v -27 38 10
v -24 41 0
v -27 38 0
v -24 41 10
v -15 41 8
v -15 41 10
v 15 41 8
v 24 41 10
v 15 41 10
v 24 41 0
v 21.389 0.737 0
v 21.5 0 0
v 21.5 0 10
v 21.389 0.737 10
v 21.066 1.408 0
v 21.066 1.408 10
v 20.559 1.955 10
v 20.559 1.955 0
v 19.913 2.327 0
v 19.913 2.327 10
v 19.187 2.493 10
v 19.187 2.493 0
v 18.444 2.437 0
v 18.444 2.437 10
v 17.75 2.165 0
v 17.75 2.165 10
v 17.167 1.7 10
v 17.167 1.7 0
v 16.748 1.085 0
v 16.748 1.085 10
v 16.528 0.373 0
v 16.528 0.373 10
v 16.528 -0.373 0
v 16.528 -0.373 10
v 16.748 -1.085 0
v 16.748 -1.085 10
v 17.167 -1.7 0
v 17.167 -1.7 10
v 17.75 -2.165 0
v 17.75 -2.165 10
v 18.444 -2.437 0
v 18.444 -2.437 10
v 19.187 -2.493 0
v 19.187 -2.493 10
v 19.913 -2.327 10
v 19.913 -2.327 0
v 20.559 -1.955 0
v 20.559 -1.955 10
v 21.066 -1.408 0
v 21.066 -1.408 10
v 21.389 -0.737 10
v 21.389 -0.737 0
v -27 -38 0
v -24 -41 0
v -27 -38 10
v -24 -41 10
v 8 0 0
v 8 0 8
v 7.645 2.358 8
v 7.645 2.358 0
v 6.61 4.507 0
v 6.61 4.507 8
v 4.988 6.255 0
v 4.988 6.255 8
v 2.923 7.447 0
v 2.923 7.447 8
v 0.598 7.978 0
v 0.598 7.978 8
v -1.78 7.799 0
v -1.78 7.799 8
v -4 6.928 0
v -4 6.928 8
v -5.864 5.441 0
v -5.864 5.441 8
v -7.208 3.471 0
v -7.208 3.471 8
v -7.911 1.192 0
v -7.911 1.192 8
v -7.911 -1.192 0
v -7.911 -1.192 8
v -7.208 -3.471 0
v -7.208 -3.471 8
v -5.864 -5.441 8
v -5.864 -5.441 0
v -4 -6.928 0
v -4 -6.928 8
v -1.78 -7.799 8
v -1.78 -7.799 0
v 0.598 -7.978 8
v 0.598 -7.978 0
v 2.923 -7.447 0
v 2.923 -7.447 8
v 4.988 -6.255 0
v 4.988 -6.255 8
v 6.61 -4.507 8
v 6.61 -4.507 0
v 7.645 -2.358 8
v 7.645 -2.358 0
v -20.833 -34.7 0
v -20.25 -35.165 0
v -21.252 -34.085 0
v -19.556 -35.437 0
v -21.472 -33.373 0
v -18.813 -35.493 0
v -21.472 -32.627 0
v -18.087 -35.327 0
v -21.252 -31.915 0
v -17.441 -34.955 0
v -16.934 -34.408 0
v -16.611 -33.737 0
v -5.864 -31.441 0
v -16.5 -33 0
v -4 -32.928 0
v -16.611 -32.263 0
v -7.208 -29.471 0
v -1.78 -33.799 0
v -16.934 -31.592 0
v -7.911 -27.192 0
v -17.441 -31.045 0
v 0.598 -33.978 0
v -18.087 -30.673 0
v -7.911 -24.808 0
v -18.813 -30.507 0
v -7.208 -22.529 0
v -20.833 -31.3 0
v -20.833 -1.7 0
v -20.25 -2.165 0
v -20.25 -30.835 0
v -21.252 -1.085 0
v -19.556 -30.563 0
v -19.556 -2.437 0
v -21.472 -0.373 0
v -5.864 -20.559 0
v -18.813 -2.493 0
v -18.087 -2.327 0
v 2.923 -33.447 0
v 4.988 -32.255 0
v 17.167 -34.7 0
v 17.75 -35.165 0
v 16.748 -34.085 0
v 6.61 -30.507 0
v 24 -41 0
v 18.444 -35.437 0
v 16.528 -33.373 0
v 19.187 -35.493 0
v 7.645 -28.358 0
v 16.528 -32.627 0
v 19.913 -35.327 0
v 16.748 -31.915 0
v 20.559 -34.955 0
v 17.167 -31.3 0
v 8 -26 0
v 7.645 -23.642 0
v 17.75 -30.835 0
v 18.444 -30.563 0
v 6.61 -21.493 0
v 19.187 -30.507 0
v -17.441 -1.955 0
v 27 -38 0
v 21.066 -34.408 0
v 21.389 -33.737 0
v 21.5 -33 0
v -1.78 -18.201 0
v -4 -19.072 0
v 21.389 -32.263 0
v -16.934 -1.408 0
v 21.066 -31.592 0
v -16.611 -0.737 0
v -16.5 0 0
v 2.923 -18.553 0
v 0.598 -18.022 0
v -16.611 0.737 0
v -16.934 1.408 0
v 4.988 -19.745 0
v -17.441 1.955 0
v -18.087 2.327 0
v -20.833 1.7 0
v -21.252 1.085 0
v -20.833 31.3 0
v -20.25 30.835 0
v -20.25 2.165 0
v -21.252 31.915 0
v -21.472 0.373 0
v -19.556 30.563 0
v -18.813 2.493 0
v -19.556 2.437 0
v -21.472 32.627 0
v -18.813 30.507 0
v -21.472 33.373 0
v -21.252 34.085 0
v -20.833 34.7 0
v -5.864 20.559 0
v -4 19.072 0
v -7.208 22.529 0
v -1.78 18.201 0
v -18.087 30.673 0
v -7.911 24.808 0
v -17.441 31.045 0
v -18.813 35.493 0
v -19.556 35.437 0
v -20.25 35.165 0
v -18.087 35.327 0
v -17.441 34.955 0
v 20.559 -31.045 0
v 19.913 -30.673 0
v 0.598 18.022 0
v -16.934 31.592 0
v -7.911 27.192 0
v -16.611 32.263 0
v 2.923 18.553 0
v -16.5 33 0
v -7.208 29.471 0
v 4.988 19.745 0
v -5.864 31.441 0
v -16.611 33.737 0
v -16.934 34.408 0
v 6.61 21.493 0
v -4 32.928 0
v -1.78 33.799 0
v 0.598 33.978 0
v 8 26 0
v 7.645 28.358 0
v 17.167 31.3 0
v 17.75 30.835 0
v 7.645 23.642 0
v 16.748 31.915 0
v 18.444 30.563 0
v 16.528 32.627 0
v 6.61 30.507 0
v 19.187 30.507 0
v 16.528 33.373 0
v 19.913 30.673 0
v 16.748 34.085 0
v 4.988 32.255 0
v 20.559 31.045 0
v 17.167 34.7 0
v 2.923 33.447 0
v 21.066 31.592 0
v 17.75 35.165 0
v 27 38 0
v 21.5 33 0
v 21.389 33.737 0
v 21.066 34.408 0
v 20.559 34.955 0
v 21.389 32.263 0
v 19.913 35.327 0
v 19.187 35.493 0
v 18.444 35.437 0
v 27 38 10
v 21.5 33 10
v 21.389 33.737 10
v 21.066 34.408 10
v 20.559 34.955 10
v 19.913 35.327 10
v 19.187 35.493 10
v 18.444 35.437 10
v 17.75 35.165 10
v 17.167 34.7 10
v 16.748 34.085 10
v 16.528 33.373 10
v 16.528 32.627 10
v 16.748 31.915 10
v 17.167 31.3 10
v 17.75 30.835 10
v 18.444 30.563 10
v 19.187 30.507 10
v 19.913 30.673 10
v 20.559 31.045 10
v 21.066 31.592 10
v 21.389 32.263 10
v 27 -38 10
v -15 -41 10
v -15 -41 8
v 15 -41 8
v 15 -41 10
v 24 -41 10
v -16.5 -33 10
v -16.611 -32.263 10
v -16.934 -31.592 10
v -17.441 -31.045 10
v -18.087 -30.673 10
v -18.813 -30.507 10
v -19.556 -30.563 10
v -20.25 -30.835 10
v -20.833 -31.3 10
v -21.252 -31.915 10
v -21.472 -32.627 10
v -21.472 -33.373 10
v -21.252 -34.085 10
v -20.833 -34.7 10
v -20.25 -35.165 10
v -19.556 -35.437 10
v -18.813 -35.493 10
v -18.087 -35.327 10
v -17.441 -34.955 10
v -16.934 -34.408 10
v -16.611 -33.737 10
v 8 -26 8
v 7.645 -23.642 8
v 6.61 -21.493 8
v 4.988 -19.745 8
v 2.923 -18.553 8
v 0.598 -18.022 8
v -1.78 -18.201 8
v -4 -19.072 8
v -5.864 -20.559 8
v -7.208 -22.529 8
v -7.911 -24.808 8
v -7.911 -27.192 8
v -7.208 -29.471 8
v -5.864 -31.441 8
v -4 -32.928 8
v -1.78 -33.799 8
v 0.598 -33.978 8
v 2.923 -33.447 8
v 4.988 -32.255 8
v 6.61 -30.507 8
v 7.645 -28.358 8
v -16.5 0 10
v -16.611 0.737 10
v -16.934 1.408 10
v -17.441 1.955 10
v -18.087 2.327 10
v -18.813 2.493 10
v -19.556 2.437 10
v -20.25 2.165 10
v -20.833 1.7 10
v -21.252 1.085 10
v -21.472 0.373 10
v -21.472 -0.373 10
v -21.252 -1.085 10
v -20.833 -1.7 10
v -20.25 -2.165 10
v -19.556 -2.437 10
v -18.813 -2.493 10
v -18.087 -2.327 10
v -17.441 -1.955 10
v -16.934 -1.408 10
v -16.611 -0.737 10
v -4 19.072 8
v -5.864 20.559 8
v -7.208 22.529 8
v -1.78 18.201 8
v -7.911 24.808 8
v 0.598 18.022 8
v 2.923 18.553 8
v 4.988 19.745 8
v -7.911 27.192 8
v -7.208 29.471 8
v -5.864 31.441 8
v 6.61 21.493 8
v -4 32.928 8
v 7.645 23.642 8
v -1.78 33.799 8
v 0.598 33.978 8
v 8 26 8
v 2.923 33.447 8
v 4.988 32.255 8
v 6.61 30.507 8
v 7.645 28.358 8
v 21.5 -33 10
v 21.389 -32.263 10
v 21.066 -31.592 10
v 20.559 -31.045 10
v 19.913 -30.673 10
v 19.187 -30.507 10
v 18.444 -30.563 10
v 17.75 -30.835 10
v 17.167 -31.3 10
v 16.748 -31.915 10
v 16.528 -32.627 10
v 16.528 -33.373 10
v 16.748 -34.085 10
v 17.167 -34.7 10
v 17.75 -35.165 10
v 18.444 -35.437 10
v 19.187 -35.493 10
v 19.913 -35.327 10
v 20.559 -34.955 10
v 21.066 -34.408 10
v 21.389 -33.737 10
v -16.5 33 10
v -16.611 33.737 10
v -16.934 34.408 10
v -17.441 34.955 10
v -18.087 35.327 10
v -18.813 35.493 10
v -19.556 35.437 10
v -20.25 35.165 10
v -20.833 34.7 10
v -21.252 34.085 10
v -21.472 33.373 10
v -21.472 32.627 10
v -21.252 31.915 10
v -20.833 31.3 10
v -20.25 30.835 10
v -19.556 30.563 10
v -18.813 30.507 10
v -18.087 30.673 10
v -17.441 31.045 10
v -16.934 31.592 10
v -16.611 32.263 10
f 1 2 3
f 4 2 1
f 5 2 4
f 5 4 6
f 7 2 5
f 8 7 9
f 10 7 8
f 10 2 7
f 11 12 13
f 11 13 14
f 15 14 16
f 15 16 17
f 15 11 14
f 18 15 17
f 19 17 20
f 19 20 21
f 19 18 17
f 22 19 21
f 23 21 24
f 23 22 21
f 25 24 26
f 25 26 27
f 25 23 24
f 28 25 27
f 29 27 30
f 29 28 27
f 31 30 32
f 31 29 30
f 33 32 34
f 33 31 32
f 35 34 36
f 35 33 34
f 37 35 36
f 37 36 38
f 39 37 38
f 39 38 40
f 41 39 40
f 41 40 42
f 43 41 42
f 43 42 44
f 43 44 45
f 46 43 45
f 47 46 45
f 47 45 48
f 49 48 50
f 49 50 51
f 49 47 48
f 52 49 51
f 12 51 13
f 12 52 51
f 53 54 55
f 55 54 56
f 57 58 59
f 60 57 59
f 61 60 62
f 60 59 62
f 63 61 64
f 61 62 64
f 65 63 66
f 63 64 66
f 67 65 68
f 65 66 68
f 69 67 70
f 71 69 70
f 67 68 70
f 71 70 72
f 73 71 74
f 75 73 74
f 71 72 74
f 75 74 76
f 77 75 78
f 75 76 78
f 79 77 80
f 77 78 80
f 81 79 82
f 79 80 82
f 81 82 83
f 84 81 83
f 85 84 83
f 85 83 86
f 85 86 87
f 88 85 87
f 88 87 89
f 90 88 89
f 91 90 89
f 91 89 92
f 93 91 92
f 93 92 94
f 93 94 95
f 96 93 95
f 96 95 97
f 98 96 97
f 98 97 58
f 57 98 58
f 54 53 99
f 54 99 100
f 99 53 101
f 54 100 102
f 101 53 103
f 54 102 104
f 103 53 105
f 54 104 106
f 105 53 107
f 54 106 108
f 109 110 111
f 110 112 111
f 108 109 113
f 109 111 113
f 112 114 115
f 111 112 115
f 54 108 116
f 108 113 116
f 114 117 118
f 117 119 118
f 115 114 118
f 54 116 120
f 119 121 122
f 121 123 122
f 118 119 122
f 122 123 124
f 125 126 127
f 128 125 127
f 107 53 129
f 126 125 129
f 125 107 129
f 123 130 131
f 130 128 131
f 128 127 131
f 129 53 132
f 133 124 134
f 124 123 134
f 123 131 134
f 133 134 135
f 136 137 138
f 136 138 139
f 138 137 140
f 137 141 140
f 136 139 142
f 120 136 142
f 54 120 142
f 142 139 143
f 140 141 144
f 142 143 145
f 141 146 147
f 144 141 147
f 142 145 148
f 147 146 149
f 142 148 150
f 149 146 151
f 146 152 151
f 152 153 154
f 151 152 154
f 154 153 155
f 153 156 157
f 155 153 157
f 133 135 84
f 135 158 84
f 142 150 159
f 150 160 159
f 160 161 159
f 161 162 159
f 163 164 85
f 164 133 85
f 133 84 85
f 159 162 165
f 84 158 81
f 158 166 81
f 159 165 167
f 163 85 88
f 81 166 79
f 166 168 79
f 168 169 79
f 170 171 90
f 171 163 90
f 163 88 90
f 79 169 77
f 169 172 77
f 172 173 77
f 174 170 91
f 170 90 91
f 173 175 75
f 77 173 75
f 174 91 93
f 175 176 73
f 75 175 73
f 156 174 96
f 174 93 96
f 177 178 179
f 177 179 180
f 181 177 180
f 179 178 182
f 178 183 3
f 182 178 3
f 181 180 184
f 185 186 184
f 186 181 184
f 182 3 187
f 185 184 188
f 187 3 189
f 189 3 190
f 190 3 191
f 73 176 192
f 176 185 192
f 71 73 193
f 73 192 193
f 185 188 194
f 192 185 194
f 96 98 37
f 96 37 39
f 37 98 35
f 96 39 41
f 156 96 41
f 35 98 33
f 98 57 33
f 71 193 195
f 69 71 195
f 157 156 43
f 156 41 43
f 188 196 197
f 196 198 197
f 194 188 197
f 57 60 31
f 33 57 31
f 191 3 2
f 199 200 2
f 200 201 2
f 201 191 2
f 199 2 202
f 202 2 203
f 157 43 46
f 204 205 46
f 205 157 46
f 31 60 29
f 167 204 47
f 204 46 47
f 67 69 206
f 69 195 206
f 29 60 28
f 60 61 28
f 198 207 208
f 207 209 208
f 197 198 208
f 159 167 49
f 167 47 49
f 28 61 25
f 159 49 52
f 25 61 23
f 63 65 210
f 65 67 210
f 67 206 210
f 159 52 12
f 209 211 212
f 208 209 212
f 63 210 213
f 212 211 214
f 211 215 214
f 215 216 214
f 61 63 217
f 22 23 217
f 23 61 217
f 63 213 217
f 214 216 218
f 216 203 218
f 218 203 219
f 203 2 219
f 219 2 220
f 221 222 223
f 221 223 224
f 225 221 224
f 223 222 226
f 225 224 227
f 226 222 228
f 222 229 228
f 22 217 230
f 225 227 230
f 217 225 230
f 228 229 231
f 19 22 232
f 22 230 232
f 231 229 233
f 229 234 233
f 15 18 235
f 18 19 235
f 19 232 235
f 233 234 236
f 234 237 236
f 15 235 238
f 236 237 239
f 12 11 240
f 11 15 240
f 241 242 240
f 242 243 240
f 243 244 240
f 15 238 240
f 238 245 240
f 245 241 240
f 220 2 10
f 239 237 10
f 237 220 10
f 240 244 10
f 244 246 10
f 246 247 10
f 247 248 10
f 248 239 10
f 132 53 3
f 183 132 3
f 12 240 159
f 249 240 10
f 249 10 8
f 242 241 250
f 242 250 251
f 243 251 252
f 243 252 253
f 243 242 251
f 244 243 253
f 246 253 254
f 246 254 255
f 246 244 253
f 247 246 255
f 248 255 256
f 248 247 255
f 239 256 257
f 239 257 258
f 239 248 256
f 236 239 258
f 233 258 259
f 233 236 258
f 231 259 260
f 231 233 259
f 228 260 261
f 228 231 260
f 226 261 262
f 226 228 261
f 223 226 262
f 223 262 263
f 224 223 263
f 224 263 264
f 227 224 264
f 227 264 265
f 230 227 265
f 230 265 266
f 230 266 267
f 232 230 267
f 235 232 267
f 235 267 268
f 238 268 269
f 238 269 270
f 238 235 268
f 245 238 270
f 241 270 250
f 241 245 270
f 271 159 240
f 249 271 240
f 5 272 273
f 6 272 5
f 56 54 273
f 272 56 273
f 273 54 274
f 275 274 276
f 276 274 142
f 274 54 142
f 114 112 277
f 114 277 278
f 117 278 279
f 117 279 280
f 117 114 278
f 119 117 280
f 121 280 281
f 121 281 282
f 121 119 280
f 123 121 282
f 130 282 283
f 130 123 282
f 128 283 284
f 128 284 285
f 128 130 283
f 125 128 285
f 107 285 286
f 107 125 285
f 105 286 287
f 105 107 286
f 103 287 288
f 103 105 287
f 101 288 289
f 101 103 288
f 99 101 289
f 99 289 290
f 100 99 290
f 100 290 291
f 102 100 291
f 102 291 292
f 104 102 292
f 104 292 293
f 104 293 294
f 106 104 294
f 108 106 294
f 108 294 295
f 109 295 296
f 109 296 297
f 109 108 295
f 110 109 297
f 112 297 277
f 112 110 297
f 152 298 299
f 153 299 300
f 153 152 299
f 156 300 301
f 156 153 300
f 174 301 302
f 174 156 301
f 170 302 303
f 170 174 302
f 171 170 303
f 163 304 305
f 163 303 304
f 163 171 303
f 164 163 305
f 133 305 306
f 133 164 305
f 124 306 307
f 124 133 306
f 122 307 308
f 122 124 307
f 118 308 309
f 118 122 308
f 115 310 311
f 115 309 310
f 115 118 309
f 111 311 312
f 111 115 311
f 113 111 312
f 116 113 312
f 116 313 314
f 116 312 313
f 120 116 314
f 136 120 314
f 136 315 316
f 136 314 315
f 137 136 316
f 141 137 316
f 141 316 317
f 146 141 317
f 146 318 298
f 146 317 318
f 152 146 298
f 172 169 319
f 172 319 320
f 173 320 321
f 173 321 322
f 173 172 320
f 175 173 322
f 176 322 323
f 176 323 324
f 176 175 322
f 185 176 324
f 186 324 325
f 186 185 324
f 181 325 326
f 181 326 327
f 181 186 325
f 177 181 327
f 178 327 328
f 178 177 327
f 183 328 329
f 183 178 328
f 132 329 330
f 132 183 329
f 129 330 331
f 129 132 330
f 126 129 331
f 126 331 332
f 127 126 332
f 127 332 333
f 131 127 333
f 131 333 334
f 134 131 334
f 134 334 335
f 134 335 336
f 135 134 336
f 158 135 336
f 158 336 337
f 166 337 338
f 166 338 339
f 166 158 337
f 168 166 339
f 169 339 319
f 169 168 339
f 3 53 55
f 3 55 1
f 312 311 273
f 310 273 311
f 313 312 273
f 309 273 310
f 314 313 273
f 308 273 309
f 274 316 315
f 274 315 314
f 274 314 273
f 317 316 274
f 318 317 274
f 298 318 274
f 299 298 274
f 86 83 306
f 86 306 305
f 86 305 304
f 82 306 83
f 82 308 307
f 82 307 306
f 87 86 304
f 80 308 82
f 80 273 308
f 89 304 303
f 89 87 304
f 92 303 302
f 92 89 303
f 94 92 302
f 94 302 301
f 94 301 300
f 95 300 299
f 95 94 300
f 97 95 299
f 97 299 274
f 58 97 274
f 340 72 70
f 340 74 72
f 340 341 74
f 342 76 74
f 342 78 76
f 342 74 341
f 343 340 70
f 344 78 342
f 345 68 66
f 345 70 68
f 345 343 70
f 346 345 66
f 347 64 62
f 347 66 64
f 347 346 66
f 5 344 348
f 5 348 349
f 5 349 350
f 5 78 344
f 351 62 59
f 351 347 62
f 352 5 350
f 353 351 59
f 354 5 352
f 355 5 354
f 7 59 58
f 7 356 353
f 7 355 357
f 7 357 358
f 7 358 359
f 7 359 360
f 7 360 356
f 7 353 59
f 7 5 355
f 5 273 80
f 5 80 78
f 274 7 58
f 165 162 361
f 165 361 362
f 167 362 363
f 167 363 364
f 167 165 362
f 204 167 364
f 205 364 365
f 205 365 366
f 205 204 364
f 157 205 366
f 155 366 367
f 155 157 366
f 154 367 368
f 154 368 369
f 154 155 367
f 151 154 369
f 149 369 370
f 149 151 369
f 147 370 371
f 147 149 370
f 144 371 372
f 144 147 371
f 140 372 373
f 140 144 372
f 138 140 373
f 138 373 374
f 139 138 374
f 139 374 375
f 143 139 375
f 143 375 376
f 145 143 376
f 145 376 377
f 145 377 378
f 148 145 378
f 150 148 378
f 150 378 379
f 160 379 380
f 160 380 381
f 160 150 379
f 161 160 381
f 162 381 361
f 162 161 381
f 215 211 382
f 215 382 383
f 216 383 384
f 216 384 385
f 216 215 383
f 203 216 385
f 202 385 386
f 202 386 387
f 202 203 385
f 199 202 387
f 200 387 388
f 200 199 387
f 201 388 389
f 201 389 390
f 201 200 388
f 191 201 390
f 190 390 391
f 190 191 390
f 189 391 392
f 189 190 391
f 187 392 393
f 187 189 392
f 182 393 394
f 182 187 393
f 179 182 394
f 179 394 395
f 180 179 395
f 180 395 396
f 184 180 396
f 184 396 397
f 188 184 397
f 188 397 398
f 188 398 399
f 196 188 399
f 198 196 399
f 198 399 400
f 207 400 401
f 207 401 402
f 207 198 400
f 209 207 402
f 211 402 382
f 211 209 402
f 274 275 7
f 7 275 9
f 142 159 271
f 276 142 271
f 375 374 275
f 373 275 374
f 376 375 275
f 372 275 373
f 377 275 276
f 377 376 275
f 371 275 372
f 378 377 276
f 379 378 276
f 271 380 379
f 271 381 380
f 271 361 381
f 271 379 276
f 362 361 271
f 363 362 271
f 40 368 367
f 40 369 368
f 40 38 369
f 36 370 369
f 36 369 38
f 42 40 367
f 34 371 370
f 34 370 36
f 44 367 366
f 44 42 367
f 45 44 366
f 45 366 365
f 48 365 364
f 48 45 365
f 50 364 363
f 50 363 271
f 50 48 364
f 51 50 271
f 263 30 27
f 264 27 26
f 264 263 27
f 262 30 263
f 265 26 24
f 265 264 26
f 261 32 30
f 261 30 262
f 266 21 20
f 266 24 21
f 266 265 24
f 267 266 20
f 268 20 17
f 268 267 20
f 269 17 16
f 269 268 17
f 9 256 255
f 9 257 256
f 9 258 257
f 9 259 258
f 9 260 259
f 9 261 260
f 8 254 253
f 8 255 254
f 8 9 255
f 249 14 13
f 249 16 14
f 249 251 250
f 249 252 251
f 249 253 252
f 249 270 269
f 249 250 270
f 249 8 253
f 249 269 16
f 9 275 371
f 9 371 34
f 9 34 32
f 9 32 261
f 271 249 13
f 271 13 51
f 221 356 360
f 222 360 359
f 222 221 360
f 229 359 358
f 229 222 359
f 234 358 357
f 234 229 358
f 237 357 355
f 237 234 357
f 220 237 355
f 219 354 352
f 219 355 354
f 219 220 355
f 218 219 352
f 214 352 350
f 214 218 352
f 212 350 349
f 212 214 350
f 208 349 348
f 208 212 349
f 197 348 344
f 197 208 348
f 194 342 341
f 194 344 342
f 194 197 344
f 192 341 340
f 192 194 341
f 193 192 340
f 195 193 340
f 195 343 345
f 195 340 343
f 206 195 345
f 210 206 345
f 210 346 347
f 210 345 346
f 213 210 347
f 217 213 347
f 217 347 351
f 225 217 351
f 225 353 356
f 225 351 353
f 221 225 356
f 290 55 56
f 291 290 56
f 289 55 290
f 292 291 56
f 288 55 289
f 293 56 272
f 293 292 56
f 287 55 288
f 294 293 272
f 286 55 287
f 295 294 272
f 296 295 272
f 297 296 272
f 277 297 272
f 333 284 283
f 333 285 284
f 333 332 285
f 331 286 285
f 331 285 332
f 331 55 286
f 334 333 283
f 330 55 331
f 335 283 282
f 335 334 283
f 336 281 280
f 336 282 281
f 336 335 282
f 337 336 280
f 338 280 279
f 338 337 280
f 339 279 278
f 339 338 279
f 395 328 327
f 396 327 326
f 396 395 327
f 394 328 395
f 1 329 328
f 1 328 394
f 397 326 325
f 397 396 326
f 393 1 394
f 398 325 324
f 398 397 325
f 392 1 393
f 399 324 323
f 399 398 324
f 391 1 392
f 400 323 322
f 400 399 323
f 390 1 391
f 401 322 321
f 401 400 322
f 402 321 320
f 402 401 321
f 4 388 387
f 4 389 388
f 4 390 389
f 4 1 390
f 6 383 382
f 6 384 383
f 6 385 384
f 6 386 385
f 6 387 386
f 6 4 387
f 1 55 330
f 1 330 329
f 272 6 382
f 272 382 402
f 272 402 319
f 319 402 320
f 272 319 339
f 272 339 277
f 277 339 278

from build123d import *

# Parameters (mm, degrees)
F0_W     = 54
F0_H     = 82
F0_R     = 2.5
F0_R_2   = 8
F1_DEPTH = 10
F2_SIZE  = 3
F3_W     = 30
F3_H     = 82
F4_DEPTH = 2
F5_R     = 8
F6_DEPTH = 25


with BuildPart() as f1:
    # F0 (on Top) → F1 (new body)
    with BuildSketch(Plane.XY):
        Rectangle(F0_W, F0_H)
        with Locations((-19, -33)):
            Circle(F0_R, mode=Mode.SUBTRACT)
        with Locations((0, -26)):
            Circle(F0_R_2, mode=Mode.SUBTRACT)
        with Locations((19, -33)):
            Circle(F0_R, mode=Mode.SUBTRACT)
        with Locations((-19, 0)):
            Circle(F0_R, mode=Mode.SUBTRACT)
        with Locations((-19, 33)):
            Circle(F0_R, mode=Mode.SUBTRACT)
        with Locations((19, 0)):
            Circle(F0_R, mode=Mode.SUBTRACT)
        with Locations((0, 26)):
            Circle(F0_R_2, mode=Mode.SUBTRACT)
        with Locations((19, 33)):
            Circle(F0_R, mode=Mode.SUBTRACT)
    extrude(amount=F1_DEPTH)

    # F2
    f2_edges = [f1.edges().sort_by_distance(p)[0] for p in [
        (27, -41, 5),
        (-27, -41, 5),
        (27, 41, 5),
        (-27, 41, 5),
    ]]
    chamfer(f2_edges, length=F2_SIZE)

    # F3 (on face) → F4 (cut)
    with BuildSketch(Plane.XY.offset(10)):
        Rectangle(F3_W, F3_H)
    extrude(amount=-F4_DEPTH, mode=Mode.SUBTRACT)

    # F5 (on face) → F6 (cut)
    with BuildSketch(Plane.XY.offset(8)):
        Circle(F5_R)
    extrude(amount=-F6_DEPTH, mode=Mode.SUBTRACT)


solid = f1.part
